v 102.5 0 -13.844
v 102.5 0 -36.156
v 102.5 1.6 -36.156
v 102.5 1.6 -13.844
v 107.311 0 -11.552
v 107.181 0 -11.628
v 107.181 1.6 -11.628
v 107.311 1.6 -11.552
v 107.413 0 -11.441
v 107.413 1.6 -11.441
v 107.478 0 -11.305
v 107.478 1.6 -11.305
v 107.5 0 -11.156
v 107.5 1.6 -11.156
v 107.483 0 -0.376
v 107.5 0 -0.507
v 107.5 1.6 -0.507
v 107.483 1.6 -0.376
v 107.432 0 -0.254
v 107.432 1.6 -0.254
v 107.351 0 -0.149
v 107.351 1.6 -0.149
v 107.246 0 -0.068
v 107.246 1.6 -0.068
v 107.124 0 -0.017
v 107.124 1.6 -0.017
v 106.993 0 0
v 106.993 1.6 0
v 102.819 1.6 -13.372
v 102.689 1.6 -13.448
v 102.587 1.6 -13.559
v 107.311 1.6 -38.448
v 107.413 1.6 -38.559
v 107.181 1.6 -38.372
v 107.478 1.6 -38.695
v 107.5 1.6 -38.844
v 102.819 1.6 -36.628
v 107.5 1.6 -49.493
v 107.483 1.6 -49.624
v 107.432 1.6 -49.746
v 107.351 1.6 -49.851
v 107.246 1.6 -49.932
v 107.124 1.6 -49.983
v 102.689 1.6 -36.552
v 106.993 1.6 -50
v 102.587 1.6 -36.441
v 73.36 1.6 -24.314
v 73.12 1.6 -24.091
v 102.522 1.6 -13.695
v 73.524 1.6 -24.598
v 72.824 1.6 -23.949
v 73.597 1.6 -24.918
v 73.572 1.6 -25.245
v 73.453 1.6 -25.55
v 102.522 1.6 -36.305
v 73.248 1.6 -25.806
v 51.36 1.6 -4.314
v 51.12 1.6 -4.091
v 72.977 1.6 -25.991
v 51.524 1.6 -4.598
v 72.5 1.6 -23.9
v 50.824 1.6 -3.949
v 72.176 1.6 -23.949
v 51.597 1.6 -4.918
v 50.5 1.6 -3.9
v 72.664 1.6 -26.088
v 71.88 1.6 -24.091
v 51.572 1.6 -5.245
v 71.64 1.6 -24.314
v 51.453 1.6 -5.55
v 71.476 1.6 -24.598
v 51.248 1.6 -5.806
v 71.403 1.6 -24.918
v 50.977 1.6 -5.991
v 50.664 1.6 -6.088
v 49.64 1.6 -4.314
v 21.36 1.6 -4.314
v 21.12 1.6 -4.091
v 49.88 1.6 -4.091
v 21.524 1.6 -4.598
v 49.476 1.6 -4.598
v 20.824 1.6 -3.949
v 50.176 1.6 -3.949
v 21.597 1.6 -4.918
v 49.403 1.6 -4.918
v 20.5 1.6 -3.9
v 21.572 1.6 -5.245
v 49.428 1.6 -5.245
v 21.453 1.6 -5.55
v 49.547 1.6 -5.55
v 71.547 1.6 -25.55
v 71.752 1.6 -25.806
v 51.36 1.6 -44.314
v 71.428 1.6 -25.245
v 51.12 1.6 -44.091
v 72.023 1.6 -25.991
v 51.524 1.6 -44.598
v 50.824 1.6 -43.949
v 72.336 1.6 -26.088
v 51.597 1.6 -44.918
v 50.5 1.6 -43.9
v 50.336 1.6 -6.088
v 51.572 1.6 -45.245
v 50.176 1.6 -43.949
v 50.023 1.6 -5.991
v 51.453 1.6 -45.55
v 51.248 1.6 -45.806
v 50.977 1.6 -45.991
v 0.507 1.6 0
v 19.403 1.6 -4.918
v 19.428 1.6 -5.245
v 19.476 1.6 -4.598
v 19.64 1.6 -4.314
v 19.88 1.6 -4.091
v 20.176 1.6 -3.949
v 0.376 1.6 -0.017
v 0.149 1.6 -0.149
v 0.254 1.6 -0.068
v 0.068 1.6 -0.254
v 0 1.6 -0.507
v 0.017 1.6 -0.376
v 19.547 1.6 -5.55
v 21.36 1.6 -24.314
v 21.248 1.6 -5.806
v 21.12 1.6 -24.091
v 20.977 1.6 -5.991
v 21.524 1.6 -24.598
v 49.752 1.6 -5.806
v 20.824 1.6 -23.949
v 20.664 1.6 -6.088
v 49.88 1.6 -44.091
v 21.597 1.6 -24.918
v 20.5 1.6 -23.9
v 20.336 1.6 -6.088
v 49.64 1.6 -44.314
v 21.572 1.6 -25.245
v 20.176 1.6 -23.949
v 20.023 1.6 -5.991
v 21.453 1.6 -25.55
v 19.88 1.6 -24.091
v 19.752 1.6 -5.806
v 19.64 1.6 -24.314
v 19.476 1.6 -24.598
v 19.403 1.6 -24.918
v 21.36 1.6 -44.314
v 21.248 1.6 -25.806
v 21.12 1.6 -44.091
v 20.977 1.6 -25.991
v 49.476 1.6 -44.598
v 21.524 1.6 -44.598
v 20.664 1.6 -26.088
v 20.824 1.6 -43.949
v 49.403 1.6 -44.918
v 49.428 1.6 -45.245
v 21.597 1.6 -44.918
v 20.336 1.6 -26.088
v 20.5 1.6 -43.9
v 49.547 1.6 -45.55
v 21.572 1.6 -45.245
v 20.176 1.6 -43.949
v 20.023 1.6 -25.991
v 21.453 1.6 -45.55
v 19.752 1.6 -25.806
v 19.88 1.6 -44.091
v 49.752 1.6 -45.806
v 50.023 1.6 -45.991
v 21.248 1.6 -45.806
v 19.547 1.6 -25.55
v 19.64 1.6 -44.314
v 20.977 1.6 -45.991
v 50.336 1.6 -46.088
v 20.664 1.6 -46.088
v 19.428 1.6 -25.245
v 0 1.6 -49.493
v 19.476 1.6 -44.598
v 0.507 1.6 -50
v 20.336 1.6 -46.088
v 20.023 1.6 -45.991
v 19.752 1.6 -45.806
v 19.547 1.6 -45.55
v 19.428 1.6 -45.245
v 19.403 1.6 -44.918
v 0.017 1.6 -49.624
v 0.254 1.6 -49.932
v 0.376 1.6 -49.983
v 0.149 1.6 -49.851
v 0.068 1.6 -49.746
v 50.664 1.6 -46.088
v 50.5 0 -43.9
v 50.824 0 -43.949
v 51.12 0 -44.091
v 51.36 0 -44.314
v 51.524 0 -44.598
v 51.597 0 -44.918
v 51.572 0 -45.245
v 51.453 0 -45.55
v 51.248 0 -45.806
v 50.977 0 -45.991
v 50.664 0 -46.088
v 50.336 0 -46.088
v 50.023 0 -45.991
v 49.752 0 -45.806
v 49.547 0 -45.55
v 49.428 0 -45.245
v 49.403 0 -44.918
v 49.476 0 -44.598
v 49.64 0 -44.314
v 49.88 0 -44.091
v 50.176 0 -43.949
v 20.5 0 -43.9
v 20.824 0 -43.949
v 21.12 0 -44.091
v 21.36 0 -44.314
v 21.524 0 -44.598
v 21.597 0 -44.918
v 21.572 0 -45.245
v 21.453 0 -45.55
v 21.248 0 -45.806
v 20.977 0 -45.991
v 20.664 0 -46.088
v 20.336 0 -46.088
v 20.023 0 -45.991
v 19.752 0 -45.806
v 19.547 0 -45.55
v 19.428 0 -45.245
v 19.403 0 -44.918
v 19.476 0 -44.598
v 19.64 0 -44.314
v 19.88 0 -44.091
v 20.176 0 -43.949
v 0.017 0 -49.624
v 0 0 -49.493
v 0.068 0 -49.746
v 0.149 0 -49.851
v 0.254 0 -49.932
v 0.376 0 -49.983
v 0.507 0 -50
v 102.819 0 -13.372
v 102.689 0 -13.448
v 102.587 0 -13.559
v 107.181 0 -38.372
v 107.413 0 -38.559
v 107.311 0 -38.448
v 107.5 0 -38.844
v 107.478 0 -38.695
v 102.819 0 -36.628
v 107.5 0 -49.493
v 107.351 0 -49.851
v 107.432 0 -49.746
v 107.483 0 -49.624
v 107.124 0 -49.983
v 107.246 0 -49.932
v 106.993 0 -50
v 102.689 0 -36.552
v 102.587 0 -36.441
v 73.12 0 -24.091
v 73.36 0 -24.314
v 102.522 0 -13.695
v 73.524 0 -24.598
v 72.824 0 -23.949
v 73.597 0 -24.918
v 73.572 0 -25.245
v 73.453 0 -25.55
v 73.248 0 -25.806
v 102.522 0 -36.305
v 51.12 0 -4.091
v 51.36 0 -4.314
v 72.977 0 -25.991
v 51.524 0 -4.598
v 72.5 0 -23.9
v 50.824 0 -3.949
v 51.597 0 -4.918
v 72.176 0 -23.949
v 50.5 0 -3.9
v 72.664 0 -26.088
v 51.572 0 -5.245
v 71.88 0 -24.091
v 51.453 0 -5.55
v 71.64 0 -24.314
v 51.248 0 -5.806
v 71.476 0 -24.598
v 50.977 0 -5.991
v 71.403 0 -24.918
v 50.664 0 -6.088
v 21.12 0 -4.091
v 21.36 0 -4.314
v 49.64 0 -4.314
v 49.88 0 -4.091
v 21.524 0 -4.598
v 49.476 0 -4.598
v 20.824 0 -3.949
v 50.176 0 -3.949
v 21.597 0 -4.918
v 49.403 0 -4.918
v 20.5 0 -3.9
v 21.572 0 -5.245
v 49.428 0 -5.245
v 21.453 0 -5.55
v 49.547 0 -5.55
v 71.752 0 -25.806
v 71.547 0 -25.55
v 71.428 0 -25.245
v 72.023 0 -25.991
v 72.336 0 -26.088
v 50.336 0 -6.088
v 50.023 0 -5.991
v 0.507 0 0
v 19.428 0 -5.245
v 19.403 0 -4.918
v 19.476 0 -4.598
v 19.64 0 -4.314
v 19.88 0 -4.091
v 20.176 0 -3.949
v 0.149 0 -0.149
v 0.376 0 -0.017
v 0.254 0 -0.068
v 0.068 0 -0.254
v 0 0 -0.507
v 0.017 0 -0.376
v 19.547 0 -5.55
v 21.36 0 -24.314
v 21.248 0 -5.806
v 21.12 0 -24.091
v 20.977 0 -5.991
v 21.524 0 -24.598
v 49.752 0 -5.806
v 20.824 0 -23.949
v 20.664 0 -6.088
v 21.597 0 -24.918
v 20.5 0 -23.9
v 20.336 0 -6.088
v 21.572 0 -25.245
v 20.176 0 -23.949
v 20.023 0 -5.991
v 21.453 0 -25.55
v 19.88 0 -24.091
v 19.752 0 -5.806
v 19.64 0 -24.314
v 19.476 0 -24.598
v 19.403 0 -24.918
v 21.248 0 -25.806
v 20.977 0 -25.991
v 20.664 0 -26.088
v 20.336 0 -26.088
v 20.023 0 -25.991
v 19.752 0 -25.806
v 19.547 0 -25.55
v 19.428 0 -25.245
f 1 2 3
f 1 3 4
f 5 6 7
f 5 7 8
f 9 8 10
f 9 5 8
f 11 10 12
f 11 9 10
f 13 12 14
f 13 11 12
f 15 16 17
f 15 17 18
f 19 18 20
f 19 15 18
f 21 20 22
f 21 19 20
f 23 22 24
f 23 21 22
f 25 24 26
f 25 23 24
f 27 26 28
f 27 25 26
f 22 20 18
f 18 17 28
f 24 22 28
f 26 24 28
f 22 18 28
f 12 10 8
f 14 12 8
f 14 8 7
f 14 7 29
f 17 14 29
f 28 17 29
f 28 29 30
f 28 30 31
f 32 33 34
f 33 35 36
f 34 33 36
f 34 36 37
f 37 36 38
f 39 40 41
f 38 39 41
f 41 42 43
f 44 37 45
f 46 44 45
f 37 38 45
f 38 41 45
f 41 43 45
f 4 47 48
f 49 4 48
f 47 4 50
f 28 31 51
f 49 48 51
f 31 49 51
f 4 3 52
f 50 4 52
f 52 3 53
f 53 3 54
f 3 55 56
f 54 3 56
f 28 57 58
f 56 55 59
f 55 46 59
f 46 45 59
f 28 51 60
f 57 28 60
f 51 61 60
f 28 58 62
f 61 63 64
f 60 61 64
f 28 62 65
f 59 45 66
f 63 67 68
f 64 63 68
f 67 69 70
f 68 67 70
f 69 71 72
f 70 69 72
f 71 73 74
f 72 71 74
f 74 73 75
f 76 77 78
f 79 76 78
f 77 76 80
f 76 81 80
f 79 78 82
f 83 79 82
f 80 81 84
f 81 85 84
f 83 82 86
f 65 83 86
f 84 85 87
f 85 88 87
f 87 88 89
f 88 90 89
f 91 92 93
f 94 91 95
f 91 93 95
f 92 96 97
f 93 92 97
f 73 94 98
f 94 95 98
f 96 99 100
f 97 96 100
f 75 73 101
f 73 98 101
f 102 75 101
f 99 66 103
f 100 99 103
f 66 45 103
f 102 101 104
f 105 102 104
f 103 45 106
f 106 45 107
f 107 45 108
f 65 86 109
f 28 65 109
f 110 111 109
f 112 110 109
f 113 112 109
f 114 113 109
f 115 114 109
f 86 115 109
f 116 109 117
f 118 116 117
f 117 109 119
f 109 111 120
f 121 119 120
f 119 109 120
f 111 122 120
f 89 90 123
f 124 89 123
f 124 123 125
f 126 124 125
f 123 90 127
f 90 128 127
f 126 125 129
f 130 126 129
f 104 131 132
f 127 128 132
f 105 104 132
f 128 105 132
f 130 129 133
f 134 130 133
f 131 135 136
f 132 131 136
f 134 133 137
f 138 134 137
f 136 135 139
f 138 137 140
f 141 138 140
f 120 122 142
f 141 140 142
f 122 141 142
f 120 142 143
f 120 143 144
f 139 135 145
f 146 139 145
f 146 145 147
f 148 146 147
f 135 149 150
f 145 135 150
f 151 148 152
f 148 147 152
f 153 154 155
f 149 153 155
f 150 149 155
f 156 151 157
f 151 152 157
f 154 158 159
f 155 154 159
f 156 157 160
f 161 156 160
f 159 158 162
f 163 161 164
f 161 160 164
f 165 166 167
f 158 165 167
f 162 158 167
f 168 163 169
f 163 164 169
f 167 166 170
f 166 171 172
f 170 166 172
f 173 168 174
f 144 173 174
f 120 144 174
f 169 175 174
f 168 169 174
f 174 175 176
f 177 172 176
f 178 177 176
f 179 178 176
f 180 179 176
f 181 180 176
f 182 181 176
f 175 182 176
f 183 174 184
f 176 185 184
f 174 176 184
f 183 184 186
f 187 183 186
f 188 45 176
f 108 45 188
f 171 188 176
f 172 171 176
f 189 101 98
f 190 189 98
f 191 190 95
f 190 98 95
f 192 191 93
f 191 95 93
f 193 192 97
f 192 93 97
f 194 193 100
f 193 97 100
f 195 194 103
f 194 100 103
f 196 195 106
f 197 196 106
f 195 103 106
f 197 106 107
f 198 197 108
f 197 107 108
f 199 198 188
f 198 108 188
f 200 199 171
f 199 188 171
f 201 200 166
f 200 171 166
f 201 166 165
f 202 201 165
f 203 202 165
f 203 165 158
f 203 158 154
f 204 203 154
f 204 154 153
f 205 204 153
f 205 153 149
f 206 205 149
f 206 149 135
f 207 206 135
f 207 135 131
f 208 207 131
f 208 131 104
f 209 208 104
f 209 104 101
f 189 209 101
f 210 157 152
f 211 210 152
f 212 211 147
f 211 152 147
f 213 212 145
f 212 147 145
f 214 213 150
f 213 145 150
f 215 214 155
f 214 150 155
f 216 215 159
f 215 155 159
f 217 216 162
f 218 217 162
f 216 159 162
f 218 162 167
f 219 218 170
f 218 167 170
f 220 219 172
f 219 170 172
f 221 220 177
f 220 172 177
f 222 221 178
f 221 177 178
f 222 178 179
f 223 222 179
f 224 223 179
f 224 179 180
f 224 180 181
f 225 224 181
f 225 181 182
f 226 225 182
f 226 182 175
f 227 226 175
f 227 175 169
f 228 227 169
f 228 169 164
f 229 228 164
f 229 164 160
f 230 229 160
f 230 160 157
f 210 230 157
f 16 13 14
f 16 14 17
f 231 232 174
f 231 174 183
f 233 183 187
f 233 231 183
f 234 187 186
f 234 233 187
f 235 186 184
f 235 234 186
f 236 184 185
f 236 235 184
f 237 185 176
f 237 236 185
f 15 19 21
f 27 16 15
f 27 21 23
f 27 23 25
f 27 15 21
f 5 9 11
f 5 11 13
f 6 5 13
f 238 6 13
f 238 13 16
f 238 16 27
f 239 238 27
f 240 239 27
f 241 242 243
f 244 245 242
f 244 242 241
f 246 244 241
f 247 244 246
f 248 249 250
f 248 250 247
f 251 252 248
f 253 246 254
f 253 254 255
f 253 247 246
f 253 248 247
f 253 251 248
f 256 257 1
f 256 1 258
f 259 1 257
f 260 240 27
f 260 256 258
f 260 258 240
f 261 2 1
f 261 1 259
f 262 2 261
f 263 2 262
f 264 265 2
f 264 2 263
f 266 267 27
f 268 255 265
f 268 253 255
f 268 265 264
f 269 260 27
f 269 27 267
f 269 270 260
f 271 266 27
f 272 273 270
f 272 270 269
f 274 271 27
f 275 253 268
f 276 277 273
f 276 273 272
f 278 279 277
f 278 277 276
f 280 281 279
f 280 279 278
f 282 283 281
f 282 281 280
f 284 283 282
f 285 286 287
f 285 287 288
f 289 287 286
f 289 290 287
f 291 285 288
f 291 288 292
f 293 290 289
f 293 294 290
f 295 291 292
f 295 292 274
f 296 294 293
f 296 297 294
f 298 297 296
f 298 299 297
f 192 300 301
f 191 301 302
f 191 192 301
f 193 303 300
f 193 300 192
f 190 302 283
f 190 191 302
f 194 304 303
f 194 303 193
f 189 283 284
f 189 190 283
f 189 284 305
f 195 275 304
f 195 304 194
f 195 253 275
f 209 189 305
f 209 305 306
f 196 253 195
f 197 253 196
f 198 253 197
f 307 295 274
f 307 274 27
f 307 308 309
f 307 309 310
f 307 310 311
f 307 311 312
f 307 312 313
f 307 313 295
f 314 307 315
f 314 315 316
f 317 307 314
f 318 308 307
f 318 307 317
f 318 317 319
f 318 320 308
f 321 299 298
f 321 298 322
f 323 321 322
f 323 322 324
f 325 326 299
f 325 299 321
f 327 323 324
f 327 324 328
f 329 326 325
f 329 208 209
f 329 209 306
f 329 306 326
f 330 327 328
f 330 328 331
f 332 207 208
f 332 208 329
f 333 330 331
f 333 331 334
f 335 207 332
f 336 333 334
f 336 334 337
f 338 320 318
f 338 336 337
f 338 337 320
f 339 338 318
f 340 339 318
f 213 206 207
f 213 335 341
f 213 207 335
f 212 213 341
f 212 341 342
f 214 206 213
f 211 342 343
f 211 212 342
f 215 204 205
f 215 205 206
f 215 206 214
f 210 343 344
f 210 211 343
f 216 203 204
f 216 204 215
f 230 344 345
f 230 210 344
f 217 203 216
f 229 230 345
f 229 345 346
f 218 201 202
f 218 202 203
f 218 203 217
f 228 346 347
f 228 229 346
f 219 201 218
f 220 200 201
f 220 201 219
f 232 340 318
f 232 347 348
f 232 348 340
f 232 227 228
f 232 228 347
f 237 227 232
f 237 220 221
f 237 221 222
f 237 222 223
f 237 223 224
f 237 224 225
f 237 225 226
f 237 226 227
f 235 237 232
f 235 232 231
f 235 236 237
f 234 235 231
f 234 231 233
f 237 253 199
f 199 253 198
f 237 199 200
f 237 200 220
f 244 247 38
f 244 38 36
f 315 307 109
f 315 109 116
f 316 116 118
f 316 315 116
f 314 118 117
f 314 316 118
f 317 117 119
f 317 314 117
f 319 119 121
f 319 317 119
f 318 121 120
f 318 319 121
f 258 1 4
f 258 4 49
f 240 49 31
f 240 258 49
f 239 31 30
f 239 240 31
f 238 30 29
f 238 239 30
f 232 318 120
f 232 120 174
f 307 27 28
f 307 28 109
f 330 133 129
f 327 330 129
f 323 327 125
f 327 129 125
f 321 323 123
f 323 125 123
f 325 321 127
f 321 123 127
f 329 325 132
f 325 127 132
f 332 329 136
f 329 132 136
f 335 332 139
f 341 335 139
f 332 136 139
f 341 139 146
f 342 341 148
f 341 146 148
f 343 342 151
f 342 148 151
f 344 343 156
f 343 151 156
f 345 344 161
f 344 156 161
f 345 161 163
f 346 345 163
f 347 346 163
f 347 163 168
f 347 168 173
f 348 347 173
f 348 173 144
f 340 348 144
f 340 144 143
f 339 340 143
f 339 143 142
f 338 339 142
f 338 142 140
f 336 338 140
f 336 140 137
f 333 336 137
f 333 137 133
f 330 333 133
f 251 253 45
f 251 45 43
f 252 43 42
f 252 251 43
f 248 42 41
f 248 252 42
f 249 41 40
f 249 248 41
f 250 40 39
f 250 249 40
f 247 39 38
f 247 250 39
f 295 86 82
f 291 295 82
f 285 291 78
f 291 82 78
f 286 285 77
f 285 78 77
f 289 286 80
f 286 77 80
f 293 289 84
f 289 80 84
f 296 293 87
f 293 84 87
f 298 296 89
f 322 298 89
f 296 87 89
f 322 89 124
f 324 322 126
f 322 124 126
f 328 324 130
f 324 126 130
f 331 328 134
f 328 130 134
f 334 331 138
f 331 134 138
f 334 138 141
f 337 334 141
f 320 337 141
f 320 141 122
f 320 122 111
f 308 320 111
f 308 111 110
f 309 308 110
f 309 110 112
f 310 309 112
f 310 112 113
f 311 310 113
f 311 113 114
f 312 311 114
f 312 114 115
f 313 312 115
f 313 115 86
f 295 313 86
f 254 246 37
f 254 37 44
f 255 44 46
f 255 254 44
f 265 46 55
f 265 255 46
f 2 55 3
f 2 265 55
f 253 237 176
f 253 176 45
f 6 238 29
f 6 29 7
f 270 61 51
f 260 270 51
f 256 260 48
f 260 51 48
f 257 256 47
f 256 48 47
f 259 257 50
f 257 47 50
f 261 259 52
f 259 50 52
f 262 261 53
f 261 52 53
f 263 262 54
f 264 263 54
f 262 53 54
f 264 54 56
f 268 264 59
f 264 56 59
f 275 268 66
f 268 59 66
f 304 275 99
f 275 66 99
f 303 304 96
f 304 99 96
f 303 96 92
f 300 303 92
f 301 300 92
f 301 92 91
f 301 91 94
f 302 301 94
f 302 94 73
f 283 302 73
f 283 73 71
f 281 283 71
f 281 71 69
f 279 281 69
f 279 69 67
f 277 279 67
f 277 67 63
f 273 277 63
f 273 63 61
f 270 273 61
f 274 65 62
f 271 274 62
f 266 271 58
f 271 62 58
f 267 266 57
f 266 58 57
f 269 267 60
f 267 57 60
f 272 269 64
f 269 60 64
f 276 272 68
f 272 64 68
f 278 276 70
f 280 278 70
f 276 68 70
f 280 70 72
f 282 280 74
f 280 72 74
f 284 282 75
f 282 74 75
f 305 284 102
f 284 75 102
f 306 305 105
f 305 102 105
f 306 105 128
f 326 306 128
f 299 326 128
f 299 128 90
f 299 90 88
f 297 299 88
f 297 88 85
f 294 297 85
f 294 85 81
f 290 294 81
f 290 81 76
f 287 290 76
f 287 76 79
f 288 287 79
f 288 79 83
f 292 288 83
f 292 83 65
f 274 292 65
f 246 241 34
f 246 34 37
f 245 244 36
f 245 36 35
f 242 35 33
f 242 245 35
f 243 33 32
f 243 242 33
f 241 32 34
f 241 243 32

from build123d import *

# Parameters (mm, degrees)
BOSS_EXTRUDE1_DEPTH = 1.6
SKETCH2_R           = 1.1
CUT_EXTRUDE1_DEPTH  = 119.569852829


with BuildPart() as part:
    # Sketch1 → Boss-Extrude1 (new body)
    with BuildSketch(Plane(origin=(0, 0, 0), x_dir=(1, 0, 0), z_dir=(0, 1, 0))):
        with BuildLine():
            Line((102.5, 50), (106.992600234, 50))
            ThreePointArc((106.992600234, 50), (107.351386049, 49.851386049), (107.5, 49.492600234))
            Line((107.5, 49.492600234), (107.5, 38.843526366))
            ThreePointArc((107.5, 38.843526366), (107.412761353, 38.55906344), (107.181043776, 38.372417511))
            Line((107.181043776, 38.372417511), (102.818956224, 36.627582489))
            ThreePointArc((102.818956224, 36.627582489), (102.587238647, 36.44093656), (102.5, 36.156473634))
            Line((102.5, 36.156473634), (102.5, 13.843526366))
            ThreePointArc((102.5, 13.843526366), (102.587238647, 13.55906344), (102.818956224, 13.372417511))
            Line((102.818956224, 13.372417511), (107.181043776, 11.627582489))
            ThreePointArc((107.181043776, 11.627582489), (107.412761353, 11.44093656), (107.5, 11.156473634))
            Line((107.5, 11.156473634), (107.5, 0.507399766))
            ThreePointArc((107.5, 0.507399766), (107.351386049, 0.148613951), (106.992600234, 0))
            Line((106.992600234, 0), (102.5, 0))
            Line((102.5, 0), (0.507399766, 0))
            ThreePointArc((0.507399766, 0), (0.148613951, 0.148613951), (0, 0.507399766))
            Line((0, 0.507399766), (0, 49.492600234))
            ThreePointArc((0, 49.492600234), (0.148613951, 49.851386049), (0.507399766, 50))
            Line((0.507399766, 50), (102.5, 50))
        make_face()
    extrude(amount=BOSS_EXTRUDE1_DEPTH)

    # Sketch2 → Cut-Extrude1 (cut, through all)
    with BuildSketch(Plane(origin=(0, 1.6, 0), x_dir=(1, 0, 0), z_dir=(0, 1, 0))):
        with Locations(Location((20.5, 5, 0), (0, 0, 270))):
            Circle(SKETCH2_R)
        with Locations(Location((20.5, 25, 0), (0, 0, 270))):
            Circle(SKETCH2_R)
        with Locations(Location((20.5, 45, 0), (0, 0, 270))):
            Circle(SKETCH2_R)
        with Locations(Location((50.5, 45, 0), (0, 0, 270))):
            Circle(SKETCH2_R)
        with Locations(Location((50.5, 5, 0), (0, 0, 270))):
            Circle(SKETCH2_R)
        with Locations(Location((72.5, 25, 0), (0, 0, 270))):
            Circle(SKETCH2_R)
    extrude(amount=-CUT_EXTRUDE1_DEPTH, mode=Mode.SUBTRACT)


solid = part.part
